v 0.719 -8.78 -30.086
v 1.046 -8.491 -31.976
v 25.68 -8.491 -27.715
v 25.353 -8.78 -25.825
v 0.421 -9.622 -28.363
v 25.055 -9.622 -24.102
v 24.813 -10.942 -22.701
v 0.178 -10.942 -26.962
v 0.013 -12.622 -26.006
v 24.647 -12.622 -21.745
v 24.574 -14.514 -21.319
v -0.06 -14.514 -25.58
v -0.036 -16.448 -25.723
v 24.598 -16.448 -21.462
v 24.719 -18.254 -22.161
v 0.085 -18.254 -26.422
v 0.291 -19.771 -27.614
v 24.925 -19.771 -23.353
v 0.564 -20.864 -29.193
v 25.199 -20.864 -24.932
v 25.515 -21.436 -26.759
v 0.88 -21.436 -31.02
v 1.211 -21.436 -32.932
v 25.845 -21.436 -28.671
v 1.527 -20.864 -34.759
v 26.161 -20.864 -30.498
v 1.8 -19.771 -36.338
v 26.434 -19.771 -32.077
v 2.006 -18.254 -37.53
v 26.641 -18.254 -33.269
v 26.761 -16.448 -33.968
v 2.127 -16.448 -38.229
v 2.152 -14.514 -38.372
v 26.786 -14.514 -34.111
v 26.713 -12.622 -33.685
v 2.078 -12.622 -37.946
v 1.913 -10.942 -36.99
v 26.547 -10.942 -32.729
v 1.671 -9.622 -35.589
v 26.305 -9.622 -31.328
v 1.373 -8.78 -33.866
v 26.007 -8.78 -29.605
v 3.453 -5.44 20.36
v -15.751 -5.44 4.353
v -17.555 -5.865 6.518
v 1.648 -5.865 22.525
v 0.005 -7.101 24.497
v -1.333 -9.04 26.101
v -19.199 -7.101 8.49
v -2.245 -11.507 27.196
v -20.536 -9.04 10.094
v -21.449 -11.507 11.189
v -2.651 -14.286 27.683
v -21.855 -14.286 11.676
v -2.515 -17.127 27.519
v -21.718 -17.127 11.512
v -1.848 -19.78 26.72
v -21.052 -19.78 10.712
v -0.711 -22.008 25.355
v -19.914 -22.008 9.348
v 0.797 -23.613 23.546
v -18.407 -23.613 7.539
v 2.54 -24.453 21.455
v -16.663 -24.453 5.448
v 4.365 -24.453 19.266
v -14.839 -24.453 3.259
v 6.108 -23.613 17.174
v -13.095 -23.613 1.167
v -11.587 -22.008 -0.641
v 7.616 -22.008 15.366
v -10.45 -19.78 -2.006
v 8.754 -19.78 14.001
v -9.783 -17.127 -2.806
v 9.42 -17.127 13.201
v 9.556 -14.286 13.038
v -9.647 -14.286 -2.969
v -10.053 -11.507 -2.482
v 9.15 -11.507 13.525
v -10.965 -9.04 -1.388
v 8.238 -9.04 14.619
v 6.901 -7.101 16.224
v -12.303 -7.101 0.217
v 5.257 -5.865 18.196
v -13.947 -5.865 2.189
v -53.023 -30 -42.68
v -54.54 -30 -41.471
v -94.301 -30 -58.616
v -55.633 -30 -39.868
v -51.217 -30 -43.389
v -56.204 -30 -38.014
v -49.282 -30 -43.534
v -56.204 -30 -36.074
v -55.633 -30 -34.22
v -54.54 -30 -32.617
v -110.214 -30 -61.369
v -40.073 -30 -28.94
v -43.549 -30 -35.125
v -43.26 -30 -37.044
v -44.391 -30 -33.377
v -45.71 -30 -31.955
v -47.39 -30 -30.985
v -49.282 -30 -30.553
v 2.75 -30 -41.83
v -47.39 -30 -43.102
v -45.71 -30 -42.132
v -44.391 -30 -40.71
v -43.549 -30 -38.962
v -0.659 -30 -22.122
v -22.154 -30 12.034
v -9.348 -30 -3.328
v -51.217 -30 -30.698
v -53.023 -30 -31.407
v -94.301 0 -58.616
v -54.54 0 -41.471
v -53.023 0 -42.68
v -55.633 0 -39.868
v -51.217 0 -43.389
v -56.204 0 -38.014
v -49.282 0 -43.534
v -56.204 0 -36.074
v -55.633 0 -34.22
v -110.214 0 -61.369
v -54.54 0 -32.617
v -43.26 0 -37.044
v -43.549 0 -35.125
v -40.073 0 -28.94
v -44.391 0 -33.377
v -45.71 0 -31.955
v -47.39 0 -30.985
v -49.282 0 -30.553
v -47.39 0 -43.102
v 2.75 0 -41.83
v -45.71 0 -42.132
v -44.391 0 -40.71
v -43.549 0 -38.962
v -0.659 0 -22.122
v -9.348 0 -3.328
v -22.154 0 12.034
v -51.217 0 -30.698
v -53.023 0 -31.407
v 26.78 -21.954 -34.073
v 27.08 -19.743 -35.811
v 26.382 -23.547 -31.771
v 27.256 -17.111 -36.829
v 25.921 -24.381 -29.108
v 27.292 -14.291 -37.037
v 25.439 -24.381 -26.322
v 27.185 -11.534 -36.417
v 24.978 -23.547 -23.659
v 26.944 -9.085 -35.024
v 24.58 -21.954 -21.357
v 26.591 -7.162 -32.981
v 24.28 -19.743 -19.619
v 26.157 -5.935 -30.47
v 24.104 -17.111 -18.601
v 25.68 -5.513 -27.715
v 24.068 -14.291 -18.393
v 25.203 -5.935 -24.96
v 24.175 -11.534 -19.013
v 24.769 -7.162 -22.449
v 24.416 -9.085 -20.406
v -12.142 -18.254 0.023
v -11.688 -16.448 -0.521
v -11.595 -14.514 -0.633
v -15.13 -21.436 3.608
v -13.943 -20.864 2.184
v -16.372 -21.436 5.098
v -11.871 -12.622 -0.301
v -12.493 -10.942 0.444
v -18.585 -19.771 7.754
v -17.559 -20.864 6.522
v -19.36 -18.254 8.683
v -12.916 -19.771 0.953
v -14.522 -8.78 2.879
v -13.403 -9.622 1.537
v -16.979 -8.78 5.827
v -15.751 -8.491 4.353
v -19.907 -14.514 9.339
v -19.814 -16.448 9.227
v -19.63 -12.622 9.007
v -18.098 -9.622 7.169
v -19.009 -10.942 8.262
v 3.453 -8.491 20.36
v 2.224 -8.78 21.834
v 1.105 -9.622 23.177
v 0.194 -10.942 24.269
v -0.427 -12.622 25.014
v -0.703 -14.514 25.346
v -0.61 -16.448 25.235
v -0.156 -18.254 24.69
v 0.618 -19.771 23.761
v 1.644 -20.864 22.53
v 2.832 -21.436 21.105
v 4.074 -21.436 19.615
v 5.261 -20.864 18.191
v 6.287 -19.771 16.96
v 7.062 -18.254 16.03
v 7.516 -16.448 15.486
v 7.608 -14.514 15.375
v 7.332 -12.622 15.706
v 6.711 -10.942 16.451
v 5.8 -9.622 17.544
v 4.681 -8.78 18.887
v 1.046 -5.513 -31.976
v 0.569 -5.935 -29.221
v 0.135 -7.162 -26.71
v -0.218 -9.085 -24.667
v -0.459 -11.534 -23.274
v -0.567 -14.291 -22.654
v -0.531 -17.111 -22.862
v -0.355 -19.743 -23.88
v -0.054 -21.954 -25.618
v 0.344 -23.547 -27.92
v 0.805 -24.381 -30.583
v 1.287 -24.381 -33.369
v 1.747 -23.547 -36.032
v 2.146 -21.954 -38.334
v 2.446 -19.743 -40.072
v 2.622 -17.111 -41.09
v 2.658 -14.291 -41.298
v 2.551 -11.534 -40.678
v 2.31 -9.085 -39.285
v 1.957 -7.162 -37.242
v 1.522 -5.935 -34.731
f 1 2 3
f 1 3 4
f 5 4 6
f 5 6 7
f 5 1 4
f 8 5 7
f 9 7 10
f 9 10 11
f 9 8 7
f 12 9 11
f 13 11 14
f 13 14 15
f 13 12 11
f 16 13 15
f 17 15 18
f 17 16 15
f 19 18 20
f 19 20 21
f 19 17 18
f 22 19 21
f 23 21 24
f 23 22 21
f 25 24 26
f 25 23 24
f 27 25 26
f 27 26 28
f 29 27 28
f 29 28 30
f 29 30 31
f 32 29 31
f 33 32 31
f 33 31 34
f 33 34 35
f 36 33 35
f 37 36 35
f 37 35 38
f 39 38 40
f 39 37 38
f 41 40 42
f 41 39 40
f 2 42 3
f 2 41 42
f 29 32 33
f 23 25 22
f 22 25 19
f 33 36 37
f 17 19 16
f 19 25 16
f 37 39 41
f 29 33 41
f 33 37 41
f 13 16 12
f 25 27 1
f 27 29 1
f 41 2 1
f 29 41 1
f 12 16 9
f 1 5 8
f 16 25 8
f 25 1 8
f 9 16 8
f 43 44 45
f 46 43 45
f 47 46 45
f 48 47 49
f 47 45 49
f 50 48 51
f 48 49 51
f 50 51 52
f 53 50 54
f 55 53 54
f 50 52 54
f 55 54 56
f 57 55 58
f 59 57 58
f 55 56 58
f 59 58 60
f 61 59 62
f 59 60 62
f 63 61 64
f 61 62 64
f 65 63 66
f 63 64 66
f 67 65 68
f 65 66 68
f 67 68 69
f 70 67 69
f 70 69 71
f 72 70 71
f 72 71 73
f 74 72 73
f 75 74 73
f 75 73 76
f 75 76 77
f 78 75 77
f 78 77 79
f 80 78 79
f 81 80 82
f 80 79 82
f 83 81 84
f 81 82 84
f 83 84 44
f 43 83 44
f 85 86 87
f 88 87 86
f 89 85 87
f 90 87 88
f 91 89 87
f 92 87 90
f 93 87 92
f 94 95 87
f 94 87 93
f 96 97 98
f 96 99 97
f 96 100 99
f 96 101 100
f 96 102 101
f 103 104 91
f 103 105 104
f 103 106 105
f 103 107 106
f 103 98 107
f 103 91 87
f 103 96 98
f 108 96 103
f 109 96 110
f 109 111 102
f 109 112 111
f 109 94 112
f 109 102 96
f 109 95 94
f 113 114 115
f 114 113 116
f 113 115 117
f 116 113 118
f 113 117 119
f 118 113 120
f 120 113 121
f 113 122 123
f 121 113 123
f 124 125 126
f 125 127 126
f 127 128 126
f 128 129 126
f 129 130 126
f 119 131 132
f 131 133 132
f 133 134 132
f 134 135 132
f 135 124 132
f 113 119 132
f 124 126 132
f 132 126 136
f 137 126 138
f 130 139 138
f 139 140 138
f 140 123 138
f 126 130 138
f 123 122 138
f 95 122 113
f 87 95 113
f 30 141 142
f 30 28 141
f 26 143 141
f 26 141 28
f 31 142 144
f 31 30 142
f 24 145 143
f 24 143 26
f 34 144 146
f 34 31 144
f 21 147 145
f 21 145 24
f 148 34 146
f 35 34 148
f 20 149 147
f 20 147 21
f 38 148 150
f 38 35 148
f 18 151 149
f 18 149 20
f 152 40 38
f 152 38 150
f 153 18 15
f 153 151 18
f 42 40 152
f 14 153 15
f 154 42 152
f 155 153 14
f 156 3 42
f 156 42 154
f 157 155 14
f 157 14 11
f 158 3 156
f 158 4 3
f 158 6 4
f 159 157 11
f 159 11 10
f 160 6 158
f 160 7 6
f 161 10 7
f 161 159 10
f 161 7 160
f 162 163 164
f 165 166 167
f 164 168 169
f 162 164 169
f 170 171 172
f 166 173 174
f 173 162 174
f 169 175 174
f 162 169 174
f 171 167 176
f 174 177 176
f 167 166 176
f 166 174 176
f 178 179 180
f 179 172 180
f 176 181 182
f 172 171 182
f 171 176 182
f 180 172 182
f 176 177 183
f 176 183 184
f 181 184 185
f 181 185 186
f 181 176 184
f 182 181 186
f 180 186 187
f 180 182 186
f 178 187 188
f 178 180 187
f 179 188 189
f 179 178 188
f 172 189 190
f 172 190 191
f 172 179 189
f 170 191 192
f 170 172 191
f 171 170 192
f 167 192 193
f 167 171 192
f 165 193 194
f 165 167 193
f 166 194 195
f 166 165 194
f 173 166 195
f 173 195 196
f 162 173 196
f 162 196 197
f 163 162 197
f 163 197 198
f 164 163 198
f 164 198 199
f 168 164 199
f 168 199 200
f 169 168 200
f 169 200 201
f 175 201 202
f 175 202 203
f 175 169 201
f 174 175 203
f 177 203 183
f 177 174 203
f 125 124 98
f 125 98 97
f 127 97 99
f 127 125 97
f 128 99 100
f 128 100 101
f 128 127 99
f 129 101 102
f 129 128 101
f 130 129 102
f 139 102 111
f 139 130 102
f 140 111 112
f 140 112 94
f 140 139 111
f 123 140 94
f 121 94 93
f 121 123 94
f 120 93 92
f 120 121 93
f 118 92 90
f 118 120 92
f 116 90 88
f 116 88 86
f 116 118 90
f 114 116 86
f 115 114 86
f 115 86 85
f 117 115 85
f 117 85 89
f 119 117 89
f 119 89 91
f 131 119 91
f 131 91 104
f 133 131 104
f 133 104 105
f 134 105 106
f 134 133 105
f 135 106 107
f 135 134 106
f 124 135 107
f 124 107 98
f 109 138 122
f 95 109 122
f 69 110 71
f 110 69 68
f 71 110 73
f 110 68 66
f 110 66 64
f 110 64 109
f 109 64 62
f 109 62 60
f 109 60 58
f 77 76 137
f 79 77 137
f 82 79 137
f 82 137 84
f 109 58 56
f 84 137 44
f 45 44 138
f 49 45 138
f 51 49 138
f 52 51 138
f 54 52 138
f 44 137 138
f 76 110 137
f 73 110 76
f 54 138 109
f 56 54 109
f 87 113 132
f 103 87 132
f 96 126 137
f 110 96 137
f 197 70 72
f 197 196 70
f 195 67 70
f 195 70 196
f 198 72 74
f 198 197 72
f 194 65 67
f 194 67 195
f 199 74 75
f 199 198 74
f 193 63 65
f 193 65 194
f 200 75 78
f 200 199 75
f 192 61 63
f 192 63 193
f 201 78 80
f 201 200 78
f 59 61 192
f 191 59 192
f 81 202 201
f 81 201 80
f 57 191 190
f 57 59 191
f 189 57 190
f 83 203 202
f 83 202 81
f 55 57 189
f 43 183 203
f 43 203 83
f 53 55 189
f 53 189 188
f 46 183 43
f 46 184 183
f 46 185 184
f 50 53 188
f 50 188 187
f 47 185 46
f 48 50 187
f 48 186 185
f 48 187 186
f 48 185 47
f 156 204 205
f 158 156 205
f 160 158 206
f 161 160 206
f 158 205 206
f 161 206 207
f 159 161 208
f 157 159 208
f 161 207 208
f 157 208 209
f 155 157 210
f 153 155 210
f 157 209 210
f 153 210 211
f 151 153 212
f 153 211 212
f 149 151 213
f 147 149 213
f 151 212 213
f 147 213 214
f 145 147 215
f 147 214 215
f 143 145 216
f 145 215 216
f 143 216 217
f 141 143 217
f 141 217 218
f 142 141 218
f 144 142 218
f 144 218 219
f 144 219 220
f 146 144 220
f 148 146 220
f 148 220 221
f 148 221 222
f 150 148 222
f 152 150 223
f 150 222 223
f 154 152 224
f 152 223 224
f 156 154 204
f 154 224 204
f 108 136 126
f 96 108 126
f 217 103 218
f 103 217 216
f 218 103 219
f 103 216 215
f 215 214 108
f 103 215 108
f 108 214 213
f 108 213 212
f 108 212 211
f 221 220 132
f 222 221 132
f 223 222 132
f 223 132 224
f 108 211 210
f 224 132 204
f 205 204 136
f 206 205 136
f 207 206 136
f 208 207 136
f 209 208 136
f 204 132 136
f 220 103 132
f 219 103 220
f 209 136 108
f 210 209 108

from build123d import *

# Parameters (mm, degrees)
F0_R     = 6.50875
F1_DEPTH = 30
F3_R     = 9.4868068264
F3_R_2   = 6.50875
F4_DEPTH = 25
F2_R     = 9.5596537672
F2_R_2   = 6.50875
F5_DEPTH = 25


with BuildPart() as f1:
    # F0 (on Front) → F1 (new body)
    with BuildSketch(Plane.XZ):
        Polygon((-0.6586156459, -22.1222693219), (-40.0733649731, -28.9397127926), (-9.3479125073, -3.3282588946), (-22.1536394563, 12.0344673383), (-110.213566766, -61.3686101614), (-94.3012574901, -58.6163087811), (2.7501060895, -41.8296439855), align=None)
        with Locations((-49.7683258624, -37.0436192746)):
            Circle(F0_R, mode=Mode.SUBTRACT)
    extrude(amount=F1_DEPTH)

    # F3 (on face) → F4 (join)
    with BuildSketch(Plane(origin=(-4.3547506781, 0, -0.7532273345), x_dir=(0, 1, 0), z_dir=(0.9853687332, 0, 0.1704360868))):
        with Locations((-15, -31.6863406234)):
            Circle(F3_R)
        with Locations((-15, -31.6863406234)):
            Circle(F3_R_2, mode=Mode.SUBTRACT)
    extrude(amount=F4_DEPTH)

    # F2 (on face) → F5 (join)
    with BuildSketch(Plane(origin=(-7.1525087674, 0, -5.9620325773), x_dir=(0, 1, 0), z_dir=(0.7681363116, 0, 0.6402863475))):
        with Locations((-15, 13.4287842441)):
            Circle(F2_R)
        with Locations((-15, 13.4287842441)):
            Circle(F2_R_2, mode=Mode.SUBTRACT)
    extrude(amount=F5_DEPTH)


solid = f1.part
